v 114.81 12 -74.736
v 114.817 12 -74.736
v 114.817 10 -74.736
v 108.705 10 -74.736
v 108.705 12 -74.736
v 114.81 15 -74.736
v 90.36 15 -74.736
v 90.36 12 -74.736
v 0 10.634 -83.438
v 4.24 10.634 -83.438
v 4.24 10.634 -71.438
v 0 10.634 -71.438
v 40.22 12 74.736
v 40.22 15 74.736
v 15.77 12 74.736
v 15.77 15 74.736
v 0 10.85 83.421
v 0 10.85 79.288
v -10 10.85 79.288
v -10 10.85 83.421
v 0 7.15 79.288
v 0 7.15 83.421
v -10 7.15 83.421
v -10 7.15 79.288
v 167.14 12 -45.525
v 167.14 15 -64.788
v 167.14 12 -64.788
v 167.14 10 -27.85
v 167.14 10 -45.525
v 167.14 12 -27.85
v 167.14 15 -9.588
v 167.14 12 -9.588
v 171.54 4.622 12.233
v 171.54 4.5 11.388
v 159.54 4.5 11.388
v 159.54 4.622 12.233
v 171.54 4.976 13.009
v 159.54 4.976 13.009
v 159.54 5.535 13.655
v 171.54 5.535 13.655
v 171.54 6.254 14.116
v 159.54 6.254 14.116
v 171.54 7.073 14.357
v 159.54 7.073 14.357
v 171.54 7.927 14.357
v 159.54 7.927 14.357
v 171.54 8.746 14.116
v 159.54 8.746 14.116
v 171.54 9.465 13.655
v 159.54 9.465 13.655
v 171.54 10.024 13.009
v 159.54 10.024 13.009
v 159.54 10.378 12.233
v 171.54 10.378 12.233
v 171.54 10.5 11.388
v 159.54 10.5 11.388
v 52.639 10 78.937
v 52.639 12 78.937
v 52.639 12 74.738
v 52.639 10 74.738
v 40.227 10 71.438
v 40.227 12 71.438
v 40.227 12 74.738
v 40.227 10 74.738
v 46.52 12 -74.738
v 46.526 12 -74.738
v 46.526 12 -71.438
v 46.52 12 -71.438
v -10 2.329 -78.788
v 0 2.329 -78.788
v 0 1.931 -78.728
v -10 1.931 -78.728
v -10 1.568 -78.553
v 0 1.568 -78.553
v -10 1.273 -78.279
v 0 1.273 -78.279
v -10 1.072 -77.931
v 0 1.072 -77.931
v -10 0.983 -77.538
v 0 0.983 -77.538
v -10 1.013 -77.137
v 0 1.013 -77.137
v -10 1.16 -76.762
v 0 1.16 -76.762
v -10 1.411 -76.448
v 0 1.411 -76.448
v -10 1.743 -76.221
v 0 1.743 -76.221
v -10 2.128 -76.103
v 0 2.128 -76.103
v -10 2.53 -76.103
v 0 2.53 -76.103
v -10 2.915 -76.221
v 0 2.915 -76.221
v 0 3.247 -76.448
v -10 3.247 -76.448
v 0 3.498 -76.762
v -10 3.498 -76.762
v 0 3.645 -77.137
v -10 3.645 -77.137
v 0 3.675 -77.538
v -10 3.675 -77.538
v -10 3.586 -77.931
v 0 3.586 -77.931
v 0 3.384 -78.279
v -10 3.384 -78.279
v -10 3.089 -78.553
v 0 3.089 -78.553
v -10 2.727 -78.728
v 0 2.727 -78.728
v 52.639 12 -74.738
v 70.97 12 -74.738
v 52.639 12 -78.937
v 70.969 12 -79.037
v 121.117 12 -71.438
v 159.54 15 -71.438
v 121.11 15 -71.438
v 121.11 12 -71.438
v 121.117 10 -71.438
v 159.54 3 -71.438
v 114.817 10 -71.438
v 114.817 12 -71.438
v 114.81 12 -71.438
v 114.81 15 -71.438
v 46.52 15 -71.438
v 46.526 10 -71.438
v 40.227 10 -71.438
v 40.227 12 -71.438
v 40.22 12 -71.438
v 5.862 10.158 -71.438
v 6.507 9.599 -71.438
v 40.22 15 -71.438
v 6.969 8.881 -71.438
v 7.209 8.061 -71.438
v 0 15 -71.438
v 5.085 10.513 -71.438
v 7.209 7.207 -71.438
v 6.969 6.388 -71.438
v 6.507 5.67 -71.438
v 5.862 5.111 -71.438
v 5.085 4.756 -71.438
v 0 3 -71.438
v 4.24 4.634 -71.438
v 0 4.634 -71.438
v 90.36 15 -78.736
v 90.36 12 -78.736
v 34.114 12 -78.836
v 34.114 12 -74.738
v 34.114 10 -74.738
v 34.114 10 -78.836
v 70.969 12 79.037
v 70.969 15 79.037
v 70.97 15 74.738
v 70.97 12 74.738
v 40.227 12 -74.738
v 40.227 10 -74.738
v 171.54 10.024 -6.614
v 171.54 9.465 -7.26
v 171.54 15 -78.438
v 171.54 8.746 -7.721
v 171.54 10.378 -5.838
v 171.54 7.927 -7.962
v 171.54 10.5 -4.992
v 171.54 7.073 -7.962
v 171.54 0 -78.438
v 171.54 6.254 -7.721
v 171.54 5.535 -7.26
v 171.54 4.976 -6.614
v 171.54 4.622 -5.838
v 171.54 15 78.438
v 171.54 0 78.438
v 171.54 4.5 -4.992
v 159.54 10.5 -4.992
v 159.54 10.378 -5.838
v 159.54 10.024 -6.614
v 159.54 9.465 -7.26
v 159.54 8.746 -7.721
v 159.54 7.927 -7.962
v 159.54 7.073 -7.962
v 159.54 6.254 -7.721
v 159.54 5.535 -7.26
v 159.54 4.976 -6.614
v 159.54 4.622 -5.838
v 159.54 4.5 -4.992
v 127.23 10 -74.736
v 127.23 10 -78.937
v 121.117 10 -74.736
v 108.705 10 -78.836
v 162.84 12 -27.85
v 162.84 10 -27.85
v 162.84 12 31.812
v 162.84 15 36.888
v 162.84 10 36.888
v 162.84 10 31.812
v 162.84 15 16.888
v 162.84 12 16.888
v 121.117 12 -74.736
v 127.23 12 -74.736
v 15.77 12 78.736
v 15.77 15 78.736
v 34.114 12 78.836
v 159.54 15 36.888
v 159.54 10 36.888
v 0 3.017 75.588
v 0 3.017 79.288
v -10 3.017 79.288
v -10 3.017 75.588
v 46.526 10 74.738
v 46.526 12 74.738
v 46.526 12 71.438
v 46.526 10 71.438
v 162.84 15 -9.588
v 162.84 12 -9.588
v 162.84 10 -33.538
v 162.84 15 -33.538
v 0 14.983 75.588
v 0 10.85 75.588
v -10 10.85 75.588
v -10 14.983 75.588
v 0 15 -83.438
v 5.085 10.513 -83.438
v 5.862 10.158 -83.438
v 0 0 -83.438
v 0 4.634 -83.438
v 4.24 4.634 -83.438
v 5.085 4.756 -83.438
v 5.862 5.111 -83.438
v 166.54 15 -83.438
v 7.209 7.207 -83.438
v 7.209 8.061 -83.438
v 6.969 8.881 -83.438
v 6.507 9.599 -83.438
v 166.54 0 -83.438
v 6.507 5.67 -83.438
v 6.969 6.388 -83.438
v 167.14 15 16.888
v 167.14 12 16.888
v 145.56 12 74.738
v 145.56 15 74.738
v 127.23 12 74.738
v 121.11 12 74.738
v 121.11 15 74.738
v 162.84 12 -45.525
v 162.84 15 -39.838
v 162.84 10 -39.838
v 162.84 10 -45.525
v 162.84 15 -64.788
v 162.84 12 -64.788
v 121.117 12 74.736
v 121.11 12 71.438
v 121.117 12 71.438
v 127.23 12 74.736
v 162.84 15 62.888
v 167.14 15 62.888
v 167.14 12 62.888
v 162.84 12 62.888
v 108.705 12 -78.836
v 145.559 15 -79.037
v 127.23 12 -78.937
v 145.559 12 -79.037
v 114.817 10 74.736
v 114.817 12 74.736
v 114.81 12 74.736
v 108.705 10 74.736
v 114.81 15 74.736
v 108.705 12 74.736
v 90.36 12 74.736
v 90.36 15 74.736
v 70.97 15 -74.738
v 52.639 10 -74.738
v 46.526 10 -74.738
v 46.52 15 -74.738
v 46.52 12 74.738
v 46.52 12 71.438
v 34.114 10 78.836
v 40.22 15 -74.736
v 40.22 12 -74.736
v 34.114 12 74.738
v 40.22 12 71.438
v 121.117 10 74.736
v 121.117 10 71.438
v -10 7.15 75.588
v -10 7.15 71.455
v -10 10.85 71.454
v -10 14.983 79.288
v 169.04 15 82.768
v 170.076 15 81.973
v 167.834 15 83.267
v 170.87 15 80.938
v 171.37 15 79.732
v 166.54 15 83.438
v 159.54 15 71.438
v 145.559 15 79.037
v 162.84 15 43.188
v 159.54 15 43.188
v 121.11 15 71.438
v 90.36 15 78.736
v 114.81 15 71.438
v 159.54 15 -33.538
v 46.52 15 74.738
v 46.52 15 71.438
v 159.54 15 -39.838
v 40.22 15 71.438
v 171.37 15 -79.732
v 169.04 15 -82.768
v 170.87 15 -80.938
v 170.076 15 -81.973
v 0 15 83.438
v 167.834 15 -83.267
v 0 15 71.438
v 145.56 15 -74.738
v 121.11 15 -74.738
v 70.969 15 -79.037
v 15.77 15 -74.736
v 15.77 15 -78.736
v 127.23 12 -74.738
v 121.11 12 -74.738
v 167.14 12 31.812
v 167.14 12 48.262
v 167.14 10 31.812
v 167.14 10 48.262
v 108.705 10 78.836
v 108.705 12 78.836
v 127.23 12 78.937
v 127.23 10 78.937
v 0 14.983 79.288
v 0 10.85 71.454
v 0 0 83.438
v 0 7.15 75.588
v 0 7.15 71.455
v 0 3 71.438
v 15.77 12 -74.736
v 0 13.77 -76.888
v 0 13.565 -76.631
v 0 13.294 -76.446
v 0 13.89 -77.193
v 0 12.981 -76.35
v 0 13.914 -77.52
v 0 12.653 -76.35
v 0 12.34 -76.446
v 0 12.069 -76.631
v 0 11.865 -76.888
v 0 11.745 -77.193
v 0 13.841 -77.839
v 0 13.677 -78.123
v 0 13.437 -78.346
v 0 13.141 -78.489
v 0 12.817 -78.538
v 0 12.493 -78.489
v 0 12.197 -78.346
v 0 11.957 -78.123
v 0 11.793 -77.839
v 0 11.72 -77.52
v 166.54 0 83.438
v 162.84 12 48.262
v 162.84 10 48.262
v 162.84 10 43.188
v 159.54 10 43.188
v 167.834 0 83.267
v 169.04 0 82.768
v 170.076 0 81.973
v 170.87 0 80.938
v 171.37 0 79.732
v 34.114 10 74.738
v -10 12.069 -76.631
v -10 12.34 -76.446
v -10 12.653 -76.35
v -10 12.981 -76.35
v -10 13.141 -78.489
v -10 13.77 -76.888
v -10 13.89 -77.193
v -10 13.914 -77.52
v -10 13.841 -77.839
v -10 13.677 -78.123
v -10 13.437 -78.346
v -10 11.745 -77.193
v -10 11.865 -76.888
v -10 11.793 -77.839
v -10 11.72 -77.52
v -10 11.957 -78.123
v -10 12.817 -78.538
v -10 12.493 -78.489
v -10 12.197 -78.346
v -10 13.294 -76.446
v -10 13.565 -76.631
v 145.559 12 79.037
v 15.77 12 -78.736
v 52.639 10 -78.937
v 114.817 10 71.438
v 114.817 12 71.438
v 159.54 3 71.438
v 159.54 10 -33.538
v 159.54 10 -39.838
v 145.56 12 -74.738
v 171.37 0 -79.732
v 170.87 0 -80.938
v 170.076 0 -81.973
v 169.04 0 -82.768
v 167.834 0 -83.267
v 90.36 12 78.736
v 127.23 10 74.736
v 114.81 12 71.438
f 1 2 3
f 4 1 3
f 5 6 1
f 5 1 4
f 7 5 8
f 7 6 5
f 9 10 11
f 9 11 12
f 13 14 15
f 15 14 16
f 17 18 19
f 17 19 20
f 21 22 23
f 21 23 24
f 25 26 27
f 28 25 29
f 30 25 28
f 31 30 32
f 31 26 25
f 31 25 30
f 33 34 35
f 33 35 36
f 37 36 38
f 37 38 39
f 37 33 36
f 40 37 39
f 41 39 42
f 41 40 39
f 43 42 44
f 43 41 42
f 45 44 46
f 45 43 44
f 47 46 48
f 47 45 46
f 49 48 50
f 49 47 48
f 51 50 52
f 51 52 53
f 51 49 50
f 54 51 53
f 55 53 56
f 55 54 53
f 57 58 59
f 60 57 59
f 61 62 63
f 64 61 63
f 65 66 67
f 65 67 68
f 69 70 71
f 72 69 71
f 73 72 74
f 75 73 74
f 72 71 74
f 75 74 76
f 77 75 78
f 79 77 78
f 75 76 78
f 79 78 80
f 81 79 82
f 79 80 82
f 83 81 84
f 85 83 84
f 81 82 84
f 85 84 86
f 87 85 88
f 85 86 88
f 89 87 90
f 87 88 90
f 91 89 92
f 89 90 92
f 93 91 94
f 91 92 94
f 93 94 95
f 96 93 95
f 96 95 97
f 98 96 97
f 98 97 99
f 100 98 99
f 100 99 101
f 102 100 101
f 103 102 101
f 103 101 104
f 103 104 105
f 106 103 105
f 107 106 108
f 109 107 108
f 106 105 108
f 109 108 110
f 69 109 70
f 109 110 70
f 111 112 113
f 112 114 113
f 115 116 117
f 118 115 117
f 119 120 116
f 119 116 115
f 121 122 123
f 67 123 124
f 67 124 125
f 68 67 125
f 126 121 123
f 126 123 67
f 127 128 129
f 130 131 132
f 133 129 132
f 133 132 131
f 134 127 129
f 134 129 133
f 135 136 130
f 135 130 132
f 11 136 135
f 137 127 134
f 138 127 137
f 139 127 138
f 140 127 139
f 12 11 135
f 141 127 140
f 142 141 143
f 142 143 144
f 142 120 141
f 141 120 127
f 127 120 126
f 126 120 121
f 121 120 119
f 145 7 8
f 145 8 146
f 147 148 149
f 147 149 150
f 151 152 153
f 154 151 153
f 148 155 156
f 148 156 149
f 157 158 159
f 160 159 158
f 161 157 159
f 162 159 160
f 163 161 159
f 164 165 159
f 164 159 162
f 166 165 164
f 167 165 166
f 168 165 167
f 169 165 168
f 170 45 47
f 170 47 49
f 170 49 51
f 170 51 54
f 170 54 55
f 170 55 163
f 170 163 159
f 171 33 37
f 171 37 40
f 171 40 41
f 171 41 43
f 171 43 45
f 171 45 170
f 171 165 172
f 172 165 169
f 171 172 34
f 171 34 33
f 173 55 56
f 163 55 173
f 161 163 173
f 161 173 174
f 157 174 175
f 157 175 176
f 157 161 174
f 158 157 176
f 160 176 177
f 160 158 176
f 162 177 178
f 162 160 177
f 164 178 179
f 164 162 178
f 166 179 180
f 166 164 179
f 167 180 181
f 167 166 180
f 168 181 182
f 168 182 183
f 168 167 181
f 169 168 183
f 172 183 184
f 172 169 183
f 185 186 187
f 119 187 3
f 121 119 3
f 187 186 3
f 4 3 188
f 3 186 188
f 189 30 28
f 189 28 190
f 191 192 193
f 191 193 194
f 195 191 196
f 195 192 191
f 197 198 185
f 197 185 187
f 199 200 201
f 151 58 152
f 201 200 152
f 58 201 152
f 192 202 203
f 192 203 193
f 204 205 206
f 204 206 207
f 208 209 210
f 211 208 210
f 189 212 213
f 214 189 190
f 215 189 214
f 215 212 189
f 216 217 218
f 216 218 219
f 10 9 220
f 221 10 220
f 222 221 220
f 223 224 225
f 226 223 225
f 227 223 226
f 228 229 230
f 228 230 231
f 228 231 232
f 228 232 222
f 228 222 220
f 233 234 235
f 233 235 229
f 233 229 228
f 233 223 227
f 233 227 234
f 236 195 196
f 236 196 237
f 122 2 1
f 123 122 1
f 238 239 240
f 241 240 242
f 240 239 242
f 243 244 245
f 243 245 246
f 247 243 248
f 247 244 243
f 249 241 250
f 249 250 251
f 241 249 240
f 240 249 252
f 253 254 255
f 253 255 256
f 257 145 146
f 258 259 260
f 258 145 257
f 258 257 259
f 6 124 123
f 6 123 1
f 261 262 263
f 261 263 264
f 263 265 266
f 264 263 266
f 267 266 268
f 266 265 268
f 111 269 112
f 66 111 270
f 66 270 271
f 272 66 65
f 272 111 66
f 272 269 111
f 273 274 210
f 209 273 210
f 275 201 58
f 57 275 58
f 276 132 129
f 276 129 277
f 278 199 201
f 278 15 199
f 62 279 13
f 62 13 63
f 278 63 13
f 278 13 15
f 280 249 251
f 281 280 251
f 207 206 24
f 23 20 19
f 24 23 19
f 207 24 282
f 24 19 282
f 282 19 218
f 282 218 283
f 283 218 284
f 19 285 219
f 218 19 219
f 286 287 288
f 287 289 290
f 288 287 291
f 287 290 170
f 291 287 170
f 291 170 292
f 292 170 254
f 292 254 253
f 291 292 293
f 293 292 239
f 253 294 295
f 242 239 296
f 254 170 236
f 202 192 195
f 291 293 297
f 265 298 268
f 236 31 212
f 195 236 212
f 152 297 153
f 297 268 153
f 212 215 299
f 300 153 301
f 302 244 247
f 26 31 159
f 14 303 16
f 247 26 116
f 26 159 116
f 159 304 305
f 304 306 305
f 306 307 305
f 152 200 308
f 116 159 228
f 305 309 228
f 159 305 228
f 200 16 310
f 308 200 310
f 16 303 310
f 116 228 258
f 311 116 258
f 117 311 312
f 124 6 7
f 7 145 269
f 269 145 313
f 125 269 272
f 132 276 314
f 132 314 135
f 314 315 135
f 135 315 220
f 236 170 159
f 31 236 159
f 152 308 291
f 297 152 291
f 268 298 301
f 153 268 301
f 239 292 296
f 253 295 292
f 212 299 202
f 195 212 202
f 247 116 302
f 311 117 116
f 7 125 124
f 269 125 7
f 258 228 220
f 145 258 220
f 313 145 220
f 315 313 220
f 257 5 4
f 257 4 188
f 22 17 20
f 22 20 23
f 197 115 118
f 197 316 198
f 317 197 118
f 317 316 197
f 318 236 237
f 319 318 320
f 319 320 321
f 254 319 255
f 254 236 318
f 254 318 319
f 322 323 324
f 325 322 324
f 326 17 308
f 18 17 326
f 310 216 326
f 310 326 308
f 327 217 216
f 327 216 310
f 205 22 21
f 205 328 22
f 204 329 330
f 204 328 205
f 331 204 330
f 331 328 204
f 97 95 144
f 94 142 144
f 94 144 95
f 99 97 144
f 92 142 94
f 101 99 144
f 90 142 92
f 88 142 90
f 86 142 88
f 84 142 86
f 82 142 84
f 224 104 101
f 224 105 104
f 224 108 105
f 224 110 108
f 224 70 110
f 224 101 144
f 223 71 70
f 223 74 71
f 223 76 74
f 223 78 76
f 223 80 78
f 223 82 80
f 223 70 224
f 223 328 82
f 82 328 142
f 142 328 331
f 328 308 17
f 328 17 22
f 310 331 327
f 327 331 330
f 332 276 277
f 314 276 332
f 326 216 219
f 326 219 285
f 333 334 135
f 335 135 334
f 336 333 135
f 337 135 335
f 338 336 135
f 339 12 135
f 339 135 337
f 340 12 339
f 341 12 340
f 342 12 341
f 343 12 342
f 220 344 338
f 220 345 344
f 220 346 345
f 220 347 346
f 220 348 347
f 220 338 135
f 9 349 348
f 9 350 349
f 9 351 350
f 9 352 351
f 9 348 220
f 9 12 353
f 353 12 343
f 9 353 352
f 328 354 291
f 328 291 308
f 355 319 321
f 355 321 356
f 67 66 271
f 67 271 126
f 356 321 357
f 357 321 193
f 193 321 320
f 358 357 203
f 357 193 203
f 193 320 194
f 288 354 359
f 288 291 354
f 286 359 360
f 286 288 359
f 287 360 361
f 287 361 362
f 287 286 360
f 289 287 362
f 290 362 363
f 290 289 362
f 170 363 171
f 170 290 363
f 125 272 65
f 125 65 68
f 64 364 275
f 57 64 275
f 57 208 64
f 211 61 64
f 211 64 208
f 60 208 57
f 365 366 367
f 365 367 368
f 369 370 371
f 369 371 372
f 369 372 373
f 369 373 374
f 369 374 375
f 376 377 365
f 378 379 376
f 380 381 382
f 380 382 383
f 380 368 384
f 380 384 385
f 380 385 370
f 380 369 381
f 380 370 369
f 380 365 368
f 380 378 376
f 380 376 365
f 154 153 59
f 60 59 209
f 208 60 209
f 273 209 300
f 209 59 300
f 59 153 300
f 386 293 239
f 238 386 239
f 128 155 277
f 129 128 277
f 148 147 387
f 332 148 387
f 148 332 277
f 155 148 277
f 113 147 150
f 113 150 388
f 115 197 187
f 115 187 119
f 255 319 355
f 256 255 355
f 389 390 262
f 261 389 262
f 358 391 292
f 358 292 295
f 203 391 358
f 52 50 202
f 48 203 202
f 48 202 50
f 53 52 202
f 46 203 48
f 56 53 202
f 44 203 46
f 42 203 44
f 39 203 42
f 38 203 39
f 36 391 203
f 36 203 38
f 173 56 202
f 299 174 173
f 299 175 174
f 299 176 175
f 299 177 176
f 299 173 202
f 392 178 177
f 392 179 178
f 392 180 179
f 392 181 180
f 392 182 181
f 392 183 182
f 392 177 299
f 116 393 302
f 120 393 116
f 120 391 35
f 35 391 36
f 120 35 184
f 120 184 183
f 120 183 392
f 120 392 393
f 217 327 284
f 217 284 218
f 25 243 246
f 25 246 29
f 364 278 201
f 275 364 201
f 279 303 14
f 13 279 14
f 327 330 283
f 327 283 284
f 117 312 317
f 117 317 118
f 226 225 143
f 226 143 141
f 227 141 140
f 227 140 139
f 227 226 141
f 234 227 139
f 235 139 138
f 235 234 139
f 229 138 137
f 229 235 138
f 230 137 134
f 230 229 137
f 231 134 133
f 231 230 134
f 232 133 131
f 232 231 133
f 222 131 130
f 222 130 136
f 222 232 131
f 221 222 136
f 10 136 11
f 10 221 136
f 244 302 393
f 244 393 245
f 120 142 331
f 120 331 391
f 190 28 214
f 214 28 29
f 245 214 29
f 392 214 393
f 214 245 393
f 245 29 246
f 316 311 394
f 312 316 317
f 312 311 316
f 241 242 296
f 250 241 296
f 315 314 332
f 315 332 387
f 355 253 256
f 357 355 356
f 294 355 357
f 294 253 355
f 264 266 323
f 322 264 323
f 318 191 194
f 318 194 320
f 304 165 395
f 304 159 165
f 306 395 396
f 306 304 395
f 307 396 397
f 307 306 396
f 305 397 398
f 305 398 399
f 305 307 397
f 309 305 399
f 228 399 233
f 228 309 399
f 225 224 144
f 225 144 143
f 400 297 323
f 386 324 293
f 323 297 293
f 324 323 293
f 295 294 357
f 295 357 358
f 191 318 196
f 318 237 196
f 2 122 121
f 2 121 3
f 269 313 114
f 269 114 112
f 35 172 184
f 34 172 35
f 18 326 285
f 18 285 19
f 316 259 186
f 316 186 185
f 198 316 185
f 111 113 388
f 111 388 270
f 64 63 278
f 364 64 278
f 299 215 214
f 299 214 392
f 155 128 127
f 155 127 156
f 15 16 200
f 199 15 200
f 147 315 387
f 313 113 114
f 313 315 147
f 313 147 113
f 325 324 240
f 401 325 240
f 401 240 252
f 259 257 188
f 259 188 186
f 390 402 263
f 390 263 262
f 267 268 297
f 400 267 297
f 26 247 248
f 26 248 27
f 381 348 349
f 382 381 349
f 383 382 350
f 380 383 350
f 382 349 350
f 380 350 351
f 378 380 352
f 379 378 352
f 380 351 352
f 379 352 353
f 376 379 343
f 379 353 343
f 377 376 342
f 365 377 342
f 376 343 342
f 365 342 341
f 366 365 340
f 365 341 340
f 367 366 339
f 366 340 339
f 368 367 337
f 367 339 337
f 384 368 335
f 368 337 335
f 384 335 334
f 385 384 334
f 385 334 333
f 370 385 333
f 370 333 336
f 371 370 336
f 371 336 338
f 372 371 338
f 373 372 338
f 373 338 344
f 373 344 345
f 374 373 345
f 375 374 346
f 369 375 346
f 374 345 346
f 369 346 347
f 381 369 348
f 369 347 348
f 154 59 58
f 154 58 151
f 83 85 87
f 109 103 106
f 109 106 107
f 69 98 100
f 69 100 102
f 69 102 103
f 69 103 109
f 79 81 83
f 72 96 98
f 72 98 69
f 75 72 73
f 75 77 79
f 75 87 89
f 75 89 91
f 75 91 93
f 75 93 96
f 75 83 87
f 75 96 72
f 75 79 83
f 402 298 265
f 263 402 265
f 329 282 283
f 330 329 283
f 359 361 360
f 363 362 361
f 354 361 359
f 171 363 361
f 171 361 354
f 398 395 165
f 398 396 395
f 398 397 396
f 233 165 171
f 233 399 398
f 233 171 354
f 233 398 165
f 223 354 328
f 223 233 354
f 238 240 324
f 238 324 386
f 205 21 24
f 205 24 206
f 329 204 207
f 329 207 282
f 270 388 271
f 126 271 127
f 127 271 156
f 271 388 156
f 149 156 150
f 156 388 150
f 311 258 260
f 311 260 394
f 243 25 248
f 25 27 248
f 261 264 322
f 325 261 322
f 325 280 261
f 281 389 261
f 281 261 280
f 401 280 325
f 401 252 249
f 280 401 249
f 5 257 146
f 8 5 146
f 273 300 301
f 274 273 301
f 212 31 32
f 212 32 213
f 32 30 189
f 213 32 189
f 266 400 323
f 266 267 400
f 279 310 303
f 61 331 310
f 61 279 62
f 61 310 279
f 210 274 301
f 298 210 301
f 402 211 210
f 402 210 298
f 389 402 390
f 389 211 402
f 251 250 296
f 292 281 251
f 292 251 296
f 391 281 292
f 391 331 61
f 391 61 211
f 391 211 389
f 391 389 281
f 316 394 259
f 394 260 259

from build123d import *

# Parameters (mm, degrees)
SKETCH1_W           = 159.54
SKETCH1_H           = 142.875
BOSS_EXTRUDE1_DEPTH = 3
BOSS_EXTRUDE2_DEPTH = 15
CUT_EXTRUDE1_DEPTH  = 3
CUT_EXTRUDE2_DEPTH  = 2
CUT_EXTRUDE3_DEPTH  = 12
CUT_EXTRUDE4_DEPTH  = 12
SKETCH8_R           = 1.1
SKETCH8_R_2         = 1.35
BOSS_EXTRUDE3_DEPTH = 10
BOSS_EXTRUDE5_DEPTH = 10
FILLET3_R           = 5
FILLET4_R           = 5


with BuildPart() as part:
    # Sketch1 → Boss-Extrude1 (new body)
    with BuildSketch(Plane(origin=(0, 0, 0), x_dir=(1, 0, 0), z_dir=(0, 1, 0))):
        with Locations((79.77, 0)):
            Rectangle(SKETCH1_W, SKETCH1_H)
    extrude(amount=BOSS_EXTRUDE1_DEPTH)

    # Sketch3 → Boss-Extrude2 (add)
    with BuildSketch(Plane(origin=(0, 0, 0), x_dir=(1, 0, 0), z_dir=(0, 1, 0))):
        Polygon((0, 71.4375), (0, 83.4375), (171.54, 83.4375), (171.54, -83.4375), (0, -83.4375), (0, -71.4375), (159.54, -71.4375), (159.54, 71.4375), align=None)
    extrude(amount=BOSS_EXTRUDE2_DEPTH)

    # Sketch4 → Cut-Extrude1 (cut)
    with BuildSketch(Plane(origin=(0, 15, 0), x_dir=(1, 0, 0), z_dir=(0, 1, 0))):
        Polygon((46.52, 74.7375), (46.52, 71.4375), (40.22, 71.4375), (40.22, 74.735860656), (15.770004479, 74.735860656), (15.770004479, 78.735860656), (70.969180322, 79.037499922), (70.97, 74.7375), align=None)
        Polygon((121.11, 74.7375), (121.11, 71.4375), (114.81, 71.4375), (114.81, 74.735860656), (90.360004479, 74.735860656), (90.360004479, 78.735860656), (145.559180322, 79.037499922), (145.56, 74.7375), align=None)
        Polygon((145.56, -74.7375), (121.11, -74.7375), (121.11, -71.4375), (114.81, -71.4375), (114.81, -74.735860656), (90.360004479, -74.735860656), (90.360004479, -78.735860656), (145.559180322, -79.037499922), align=None)
        Polygon((70.97, -74.7375), (46.52, -74.7375), (46.52, -71.4375), (40.22, -71.4375), (40.22, -74.735860656), (15.770004479, -74.735860656), (15.770004479, -78.735860656), (70.969180322, -79.037499922), align=None)
        Polygon((159.54, -36.8875), (162.84, -36.8875), (162.84, -16.8875), (167.14, -16.8875), (167.14, -62.8875), (162.84, -62.8875), (162.84, -43.1875), (159.54, -43.1875), align=None)
        Polygon((159.54, 39.8375), (162.84, 39.8375), (162.84, 64.788405135), (167.14, 64.788405135), (167.14, 9.588405135), (162.84, 9.588405135), (162.84, 33.5375), (159.54, 33.5375), align=None)
    extrude(amount=-CUT_EXTRUDE1_DEPTH, mode=Mode.SUBTRACT)

    # Sketch5 → Cut-Extrude2 (cut)
    with BuildSketch(Plane(origin=(0, 12, 0), x_dir=(1, 0, 0), z_dir=(0, 1, 0))):
        Polygon((40.226803468, -71.4375), (40.226803468, -74.7375), (34.114303468, -74.7375), (34.114303468, -78.836104198), (52.639026882, -78.93733368), (52.639026882, -74.7375), (46.525702928, -74.7375), (46.525702928, -71.4375), align=None)
        Polygon((114.817365037, -74.735860656), (108.704865037, -74.735860656), (108.704865037, -78.836107266), (127.229588452, -78.937336748), (127.229588452, -74.735860656), (121.117088452, -74.735860656), (121.117088452, -71.4375), (114.817365037, -71.4375), align=None)
        Polygon((114.817365037, 71.4375), (114.817365037, 74.735860656), (108.704865037, 74.735860656), (108.704865037, 78.836107266), (127.229588452, 78.937336748), (127.229588452, 74.735860656), (121.117088452, 74.735860656), (121.117088452, 71.4375), align=None)
        Polygon((46.525702928, 71.4375), (40.226803468, 71.4375), (40.226803468, 74.7375), (34.114303468, 74.7375), (34.114303468, 78.836104198), (52.639026882, 78.93733368), (52.639026882, 74.7375), (46.525702928, 74.7375), align=None)
        Polygon((162.84, -31.8125), (167.14, -31.8125), (167.14, -48.2625), (162.84, -48.2625), (162.84, -43.1875), (159.54, -43.1875), (159.54, -36.8875), (162.84, -36.8875), align=None)
        Polygon((159.54, 39.8375), (162.84, 39.8375), (162.84, 45.524773716), (167.14, 45.524773716), (167.14, 27.850226284), (162.84, 27.850226284), (162.84, 33.5375), (159.54, 33.5375), align=None)
    extrude(amount=-CUT_EXTRUDE2_DEPTH, mode=Mode.SUBTRACT)

    # Sketch6 → Cut-Extrude3 (cut)
    with BuildSketch(Plane(origin=(171.54, 0, 0), x_dir=(0, 0, -1), z_dir=(1, 0, 0))):
        with BuildLine():
            Line((-11.3875, 10.5), (4.9925, 10.5))
            ThreePointArc((4.9925, 10.5), (7.9925, 7.5), (4.9925, 4.5))
            Line((4.9925, 4.5), (-11.3875, 4.5))
            ThreePointArc((-11.3875, 4.5), (-14.3875, 7.5), (-11.3875, 10.5))
        make_face()
    extrude(amount=-CUT_EXTRUDE3_DEPTH, mode=Mode.SUBTRACT)

    # Sketch7 → Cut-Extrude4 (cut)
    with BuildSketch(Plane(origin=(0, 0, -83.4375), x_dir=(-1, 0, 0), z_dir=(0, 0, -1))):
        with BuildLine():
            Line((-4.24, 10.6343), (12.14, 10.6343))
            ThreePointArc((12.14, 10.6343), (15.14, 7.6343), (12.14, 4.6343))
            Line((12.14, 4.6343), (-4.24, 4.6343))
            ThreePointArc((-4.24, 4.6343), (-7.24, 7.6343), (-4.24, 10.6343))
        make_face()
    extrude(amount=-CUT_EXTRUDE4_DEPTH, mode=Mode.SUBTRACT)

    # Sketch8 → Boss-Extrude3 (add)
    with BuildSketch(Plane.ZY):
        with Locations(Location((-77.4375, 12.81715, 0), (0, 0, 180))):
            Circle(SKETCH8_R)
        with Locations(Location((-77.4375, 2.328843142, 0), (0, 0, 180))):
            Circle(SKETCH8_R_2)
    extrude(amount=BOSS_EXTRUDE3_DEPTH)

    # Sketch9 → Boss-Extrude5 (add)
    with BuildSketch(Plane.ZY):
        Polygon((75.5875, 14.9834354), (79.2875, 14.9834354), (79.2875, 10.85), (83.421238753, 10.85), (83.421238753, 7.15), (79.2875, 7.15), (79.2875, 3.0165646), (75.5875, 3.0165646), (75.5875, 7.15000001), (71.454555518, 7.15000001), (71.454180357, 10.84999999), (75.5875, 10.84999999), align=None)
    extrude(amount=BOSS_EXTRUDE5_DEPTH)

    # Fillet3
    fillet3_edges = [part.edges().sort_by_distance(p)[0] for p in [
        (171.54, 7.5, 83.4375),
    ]]
    fillet(fillet3_edges, radius=FILLET3_R)

    # Fillet4
    fillet4_edges = [part.edges().sort_by_distance(p)[0] for p in [
        (171.54, 7.5, -83.4375),
    ]]
    fillet(fillet4_edges, radius=FILLET4_R)


solid = part.part
